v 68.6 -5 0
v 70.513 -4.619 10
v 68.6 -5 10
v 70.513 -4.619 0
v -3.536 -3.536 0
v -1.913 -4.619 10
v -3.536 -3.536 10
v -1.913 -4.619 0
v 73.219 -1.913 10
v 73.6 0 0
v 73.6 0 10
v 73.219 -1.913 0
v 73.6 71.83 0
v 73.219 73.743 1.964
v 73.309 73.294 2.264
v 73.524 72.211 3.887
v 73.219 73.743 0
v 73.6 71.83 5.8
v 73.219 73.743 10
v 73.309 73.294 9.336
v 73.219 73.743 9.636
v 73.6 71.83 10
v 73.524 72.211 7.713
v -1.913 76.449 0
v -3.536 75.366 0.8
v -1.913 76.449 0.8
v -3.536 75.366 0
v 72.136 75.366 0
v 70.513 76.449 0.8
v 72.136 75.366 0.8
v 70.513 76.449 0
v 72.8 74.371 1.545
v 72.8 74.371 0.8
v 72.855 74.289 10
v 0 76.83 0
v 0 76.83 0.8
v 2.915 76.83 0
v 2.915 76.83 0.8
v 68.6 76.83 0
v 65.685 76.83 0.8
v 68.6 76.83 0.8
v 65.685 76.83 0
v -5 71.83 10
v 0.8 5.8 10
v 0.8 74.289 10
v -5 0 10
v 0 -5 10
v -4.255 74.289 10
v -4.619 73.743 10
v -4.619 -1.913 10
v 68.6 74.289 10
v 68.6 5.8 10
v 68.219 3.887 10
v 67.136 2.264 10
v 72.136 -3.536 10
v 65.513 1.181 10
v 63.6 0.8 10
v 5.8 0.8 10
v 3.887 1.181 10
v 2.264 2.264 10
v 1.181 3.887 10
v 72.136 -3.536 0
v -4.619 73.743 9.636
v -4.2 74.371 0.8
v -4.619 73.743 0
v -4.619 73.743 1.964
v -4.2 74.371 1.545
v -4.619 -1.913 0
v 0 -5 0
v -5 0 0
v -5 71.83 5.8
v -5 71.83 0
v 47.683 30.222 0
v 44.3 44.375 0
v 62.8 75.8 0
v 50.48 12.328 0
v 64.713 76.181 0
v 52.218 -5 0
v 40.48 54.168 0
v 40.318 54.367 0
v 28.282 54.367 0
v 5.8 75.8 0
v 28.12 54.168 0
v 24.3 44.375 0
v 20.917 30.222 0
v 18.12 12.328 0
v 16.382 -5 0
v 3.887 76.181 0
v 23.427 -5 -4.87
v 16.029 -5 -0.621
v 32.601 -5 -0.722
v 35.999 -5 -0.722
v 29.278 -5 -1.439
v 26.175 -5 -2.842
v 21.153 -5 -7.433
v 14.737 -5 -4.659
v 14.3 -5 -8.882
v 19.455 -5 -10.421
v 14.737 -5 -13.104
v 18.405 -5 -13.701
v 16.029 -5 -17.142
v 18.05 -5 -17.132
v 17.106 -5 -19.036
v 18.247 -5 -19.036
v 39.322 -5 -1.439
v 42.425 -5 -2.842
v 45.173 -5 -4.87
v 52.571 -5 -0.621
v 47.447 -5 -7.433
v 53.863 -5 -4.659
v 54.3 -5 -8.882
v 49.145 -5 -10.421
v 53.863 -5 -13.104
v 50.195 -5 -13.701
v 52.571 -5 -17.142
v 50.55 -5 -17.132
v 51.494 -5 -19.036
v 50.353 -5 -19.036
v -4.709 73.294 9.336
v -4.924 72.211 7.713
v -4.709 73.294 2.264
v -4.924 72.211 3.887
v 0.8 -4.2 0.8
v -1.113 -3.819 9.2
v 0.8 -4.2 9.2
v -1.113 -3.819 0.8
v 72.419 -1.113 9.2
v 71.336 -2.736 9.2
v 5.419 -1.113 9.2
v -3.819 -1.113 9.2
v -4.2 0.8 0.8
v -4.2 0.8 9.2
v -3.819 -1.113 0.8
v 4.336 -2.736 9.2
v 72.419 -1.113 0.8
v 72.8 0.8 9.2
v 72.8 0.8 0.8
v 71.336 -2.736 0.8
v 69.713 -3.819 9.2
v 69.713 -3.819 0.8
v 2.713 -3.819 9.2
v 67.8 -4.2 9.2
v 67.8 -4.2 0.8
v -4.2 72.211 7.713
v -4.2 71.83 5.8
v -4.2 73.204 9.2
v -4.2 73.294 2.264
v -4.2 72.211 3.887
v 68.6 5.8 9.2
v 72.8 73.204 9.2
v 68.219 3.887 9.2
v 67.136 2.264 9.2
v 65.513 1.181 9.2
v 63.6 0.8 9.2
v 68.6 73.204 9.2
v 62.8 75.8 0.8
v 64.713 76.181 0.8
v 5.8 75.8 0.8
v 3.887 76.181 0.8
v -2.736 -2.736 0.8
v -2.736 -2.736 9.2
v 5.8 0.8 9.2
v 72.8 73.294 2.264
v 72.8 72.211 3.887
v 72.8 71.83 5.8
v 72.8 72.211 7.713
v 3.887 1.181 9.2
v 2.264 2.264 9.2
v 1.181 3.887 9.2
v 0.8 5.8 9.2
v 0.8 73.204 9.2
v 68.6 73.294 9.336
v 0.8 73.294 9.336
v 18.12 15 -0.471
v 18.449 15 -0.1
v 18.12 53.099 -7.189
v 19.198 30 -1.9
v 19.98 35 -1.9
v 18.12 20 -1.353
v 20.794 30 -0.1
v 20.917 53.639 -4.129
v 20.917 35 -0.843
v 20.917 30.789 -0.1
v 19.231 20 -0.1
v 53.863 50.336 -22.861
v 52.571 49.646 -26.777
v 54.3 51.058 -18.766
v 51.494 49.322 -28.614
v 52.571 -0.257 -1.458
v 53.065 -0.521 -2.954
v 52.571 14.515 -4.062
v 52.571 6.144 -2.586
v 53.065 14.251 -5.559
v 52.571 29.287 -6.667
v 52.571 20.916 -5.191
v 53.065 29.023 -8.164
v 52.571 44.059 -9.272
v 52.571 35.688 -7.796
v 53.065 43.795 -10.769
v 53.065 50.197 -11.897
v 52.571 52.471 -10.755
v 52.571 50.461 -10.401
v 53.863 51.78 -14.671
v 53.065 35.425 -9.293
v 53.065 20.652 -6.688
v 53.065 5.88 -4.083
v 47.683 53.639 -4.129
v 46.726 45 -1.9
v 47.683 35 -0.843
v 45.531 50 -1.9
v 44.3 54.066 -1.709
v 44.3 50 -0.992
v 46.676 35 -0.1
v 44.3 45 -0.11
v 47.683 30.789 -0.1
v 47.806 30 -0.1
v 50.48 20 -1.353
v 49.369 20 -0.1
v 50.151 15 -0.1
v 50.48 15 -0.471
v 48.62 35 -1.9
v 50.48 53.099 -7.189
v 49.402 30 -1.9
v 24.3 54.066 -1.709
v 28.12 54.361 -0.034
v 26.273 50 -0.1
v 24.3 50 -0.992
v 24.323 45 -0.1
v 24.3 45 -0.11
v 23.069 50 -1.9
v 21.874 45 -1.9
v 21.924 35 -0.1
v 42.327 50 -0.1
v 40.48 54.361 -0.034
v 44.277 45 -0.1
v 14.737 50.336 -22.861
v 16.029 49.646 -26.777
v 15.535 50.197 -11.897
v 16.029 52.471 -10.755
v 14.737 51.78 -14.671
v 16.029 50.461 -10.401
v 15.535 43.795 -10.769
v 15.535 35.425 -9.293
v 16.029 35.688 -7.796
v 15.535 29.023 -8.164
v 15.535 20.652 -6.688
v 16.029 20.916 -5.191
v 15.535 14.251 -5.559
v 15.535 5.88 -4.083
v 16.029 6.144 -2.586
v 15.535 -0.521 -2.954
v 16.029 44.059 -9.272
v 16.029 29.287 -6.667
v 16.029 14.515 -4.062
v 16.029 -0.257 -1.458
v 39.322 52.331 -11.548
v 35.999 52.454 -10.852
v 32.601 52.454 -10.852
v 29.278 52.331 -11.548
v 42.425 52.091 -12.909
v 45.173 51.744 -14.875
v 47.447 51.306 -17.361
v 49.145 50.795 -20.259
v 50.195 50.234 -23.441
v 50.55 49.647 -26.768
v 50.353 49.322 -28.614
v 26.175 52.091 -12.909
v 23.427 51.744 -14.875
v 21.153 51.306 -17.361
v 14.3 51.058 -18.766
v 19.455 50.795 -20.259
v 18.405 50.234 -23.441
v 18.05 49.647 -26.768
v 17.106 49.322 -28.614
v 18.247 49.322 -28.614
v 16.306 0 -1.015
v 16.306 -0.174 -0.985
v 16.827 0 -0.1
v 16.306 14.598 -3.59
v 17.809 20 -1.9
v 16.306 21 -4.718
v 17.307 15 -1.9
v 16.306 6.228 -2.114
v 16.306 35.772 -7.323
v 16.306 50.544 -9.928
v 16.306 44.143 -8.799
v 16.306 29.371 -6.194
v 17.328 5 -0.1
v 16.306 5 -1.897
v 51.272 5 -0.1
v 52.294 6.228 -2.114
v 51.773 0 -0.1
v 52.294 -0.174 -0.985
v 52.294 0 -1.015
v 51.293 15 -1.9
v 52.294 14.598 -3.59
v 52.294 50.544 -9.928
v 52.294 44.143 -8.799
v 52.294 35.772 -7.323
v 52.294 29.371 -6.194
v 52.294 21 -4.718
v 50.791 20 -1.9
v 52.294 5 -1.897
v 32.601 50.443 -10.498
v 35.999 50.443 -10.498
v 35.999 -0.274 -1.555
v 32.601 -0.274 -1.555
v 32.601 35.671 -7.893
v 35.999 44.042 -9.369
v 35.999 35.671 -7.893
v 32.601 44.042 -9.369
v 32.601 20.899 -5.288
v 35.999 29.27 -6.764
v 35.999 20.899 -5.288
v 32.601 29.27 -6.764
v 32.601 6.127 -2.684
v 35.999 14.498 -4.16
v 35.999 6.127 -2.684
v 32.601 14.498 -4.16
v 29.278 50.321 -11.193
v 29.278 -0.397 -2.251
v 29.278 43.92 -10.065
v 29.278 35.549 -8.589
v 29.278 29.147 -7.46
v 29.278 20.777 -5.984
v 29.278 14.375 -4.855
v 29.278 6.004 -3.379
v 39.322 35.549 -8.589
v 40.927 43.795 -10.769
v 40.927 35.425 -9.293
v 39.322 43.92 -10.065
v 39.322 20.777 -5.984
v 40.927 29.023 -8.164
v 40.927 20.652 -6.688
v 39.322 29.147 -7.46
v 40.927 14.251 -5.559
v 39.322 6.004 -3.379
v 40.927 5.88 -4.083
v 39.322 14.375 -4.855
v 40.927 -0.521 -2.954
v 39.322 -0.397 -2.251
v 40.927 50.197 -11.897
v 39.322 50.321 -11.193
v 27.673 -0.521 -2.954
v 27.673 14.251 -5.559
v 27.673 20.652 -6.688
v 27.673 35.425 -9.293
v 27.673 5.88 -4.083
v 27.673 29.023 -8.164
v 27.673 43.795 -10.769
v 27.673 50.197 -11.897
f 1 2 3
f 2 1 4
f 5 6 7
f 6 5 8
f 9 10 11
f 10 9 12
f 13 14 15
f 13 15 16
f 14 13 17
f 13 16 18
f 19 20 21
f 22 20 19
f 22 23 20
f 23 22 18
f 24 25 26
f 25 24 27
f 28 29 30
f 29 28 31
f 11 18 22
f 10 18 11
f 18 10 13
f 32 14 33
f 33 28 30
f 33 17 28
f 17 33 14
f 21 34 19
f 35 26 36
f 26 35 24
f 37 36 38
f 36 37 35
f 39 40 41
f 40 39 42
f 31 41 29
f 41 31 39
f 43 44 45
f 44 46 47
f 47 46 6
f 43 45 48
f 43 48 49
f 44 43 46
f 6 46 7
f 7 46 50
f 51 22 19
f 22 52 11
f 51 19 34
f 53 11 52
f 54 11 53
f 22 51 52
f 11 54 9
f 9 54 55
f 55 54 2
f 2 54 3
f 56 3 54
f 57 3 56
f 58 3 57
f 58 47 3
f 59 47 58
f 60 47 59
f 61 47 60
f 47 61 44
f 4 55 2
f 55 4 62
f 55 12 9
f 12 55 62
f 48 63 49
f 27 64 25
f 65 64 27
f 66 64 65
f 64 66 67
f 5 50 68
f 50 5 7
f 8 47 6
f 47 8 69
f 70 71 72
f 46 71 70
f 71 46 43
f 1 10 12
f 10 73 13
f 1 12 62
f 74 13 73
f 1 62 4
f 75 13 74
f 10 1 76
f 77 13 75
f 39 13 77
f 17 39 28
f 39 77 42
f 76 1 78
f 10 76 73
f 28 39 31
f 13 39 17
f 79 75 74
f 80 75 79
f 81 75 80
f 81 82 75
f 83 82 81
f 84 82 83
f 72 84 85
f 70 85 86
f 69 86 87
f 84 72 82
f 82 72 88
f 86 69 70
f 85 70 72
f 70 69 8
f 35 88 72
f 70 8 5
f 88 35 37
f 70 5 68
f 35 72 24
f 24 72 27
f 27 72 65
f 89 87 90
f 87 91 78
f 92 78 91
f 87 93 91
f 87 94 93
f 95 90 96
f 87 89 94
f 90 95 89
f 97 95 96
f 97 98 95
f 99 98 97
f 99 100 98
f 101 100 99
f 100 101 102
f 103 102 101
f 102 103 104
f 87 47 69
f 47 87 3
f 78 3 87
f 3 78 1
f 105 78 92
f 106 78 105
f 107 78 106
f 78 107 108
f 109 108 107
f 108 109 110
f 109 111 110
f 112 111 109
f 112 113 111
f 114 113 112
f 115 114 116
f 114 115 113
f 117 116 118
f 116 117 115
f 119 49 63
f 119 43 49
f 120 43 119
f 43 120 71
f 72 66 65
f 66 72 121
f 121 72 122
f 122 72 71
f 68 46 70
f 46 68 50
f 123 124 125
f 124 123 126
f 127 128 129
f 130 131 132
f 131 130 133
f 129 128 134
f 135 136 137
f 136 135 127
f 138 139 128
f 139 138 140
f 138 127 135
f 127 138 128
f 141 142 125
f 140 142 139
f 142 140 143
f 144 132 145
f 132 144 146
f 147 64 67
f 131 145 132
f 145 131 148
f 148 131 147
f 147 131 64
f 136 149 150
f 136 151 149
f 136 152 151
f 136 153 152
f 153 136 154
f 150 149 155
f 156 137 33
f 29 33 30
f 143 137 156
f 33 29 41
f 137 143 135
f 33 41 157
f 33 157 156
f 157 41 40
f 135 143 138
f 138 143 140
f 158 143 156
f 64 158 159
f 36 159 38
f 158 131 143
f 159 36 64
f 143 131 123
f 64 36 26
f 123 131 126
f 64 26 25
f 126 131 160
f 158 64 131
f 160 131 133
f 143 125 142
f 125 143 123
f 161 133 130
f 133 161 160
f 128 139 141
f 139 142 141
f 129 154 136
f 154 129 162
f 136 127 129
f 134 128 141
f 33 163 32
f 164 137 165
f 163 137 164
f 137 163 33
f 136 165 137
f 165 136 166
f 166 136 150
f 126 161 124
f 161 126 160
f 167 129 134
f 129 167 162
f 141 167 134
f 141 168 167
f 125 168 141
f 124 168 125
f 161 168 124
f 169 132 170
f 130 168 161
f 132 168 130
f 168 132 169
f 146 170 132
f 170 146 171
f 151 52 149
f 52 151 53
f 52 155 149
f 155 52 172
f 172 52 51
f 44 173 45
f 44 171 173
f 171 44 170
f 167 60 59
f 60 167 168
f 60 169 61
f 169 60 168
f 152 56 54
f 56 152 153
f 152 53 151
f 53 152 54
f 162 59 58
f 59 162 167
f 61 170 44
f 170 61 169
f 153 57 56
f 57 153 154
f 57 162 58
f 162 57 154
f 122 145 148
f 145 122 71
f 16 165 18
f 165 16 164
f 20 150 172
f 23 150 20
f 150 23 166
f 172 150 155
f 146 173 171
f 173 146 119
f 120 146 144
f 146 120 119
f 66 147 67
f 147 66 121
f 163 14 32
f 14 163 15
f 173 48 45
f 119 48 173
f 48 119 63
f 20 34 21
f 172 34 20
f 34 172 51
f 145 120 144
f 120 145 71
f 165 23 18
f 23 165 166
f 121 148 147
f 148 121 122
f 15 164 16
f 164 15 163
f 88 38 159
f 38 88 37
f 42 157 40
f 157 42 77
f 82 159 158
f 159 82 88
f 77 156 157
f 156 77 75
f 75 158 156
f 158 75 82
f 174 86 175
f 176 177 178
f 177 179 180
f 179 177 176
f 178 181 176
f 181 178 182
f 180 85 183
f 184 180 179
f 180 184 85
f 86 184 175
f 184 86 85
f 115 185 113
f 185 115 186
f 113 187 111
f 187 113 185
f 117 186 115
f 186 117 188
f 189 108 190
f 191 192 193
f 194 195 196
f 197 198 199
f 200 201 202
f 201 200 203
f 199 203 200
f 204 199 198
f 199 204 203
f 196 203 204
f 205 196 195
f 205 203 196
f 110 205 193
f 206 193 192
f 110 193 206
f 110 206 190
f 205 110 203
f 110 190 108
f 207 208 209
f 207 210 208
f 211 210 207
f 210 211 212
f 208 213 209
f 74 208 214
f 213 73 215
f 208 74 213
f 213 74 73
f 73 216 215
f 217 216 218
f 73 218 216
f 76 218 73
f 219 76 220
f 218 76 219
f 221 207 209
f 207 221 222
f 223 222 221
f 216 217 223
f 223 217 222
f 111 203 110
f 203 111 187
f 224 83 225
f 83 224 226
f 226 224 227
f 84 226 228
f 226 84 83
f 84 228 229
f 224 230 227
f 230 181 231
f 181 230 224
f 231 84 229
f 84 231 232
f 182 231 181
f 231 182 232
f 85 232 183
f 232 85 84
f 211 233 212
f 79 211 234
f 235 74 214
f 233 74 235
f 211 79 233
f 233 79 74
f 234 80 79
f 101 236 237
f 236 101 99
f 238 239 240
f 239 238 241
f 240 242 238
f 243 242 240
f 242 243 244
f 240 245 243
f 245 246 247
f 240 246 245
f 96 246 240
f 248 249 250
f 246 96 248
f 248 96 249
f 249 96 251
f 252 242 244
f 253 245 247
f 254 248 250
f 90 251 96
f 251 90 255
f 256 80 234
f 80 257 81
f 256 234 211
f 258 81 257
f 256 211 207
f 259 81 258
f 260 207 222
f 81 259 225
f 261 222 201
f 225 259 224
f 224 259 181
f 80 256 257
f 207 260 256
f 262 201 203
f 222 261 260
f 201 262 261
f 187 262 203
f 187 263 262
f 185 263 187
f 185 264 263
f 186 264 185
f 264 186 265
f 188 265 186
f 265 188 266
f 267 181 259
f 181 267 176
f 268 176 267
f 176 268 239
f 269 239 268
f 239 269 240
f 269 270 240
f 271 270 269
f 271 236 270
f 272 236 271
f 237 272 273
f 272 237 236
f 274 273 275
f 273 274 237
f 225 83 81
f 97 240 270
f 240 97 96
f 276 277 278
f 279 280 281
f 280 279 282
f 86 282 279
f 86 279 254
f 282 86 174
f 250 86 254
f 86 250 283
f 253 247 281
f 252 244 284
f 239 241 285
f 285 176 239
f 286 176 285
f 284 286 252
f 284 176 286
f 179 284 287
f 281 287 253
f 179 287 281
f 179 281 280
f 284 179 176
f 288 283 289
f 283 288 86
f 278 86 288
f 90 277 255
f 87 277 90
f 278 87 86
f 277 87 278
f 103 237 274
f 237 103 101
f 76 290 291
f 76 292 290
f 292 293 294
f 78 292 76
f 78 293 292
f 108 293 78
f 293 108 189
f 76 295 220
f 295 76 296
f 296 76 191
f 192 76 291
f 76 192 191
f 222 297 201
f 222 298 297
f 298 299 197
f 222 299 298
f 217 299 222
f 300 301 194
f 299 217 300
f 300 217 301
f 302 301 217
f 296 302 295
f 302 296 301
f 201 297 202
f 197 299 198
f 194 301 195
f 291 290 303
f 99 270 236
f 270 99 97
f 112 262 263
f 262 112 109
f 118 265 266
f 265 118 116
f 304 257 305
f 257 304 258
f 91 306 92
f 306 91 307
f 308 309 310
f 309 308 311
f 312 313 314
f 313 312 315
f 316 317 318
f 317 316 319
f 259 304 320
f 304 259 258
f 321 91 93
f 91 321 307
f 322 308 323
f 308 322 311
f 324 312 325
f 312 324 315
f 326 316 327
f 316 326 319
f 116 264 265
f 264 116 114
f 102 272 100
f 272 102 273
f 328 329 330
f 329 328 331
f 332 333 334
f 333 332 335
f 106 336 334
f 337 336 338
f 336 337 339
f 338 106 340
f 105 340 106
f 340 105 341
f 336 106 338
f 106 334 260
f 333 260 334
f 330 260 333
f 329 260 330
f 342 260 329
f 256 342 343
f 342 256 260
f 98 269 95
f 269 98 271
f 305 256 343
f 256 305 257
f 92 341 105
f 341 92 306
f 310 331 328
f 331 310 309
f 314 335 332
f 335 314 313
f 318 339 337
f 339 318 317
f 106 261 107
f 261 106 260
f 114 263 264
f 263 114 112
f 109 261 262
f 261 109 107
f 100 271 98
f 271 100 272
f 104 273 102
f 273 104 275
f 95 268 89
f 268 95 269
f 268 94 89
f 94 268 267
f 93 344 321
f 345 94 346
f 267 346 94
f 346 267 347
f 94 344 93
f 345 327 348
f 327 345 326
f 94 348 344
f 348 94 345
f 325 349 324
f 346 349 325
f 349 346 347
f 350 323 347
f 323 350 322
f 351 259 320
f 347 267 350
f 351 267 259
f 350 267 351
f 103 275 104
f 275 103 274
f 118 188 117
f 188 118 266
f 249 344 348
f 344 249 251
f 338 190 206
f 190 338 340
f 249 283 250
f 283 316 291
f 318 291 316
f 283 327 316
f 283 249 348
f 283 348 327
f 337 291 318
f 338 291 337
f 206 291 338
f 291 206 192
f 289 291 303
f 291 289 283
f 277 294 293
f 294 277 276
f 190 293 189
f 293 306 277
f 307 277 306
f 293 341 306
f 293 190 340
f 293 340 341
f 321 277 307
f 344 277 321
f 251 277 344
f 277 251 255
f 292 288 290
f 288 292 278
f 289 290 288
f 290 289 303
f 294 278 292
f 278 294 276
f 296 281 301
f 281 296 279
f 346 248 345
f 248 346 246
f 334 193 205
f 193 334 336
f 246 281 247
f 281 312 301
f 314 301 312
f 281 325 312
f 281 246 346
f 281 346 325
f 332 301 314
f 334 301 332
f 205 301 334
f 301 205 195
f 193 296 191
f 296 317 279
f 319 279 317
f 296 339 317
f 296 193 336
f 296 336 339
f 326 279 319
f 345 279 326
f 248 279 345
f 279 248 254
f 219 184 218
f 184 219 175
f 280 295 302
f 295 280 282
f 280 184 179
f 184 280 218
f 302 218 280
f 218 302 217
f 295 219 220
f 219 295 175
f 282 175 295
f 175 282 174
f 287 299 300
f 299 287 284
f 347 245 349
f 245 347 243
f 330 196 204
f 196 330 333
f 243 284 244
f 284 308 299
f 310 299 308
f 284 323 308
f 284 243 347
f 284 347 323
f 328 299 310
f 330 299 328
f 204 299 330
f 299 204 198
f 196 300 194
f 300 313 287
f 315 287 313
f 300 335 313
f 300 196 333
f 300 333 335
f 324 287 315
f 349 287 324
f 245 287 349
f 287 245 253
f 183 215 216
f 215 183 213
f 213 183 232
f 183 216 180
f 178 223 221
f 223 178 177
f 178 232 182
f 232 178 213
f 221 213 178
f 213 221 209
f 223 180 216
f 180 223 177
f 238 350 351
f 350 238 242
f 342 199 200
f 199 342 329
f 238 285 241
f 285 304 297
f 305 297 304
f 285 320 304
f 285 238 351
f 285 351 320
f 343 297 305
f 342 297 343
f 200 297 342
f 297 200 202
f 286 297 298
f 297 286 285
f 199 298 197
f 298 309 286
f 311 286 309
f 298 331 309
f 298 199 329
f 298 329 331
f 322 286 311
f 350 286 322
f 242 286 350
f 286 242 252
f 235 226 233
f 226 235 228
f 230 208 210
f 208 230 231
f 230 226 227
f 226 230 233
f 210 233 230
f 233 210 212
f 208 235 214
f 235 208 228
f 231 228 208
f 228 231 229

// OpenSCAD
/* $fn = 100; */
inner_width = 77;
inner_height = 139;
rad = 5;
thickness = 0.8;
depth = 10;
width = inner_width + (thickness * 2) - (2 * rad);
height = inner_height + (thickness * 2) - (2 * rad);
buttons_hole = 42;
buttons_hole_w = 6;
rant = 5;
over = 70;
buttons_h = 74;


mount_angle = 10;
inner_mount = 16.25;
outer_mount = 20;
mount_length = 62;

module baseblock(w=55, h=96, r=5, t=9) {
  hull() {
    cylinder(t, r=r);
    translate([w, 0, 0]) {
      translate([0, h, 0]) cylinder(t, r=r);
      cylinder(t, r=r);
      cylinder(t, r=r);
    }
    translate([0, h, 0]) cylinder(t, r=r);
  }
}



module phonecase_short() {
  short_height = height * 0.55;
  rrant = rant * 2;
  hrant = rant;
  difference() {
    baseblock(w=width, h=short_height, t=depth);
    /* hull() { */
      translate([thickness, thickness, thickness])
        baseblock(w=width - (thickness * 2), h=short_height * 2, t=depth - (thickness * 2));
      translate([thickness + rant, thickness + rant, thickness])
        baseblock(w=width - (thickness + rrant), h=short_height - (thickness * 2), t=depth);
    /* } */
    translate([width * 1.5, short_height+rad, rad+thickness])
      rotate(-90, [0, 1, 0])
        cylinder(width * 2, r=rad);
    translate([thickness + hrant, thickness + rrant + over, -thickness])
        baseblock(w=width - ((thickness + hrant) * 2), h=short_height - (thickness * 2), t=depth);
  }
}

module phonecase() {
  rrant = rant * 2;
  hrant = rant;
  difference() {
    baseblock(w=width, h=height, t=depth);
    hull() {
      translate([thickness, thickness, thickness])
        baseblock(w=width - (thickness * 2), h=height - thickness, t=depth - (thickness * 2));
      translate([thickness + rrant, thickness + rrant, thickness])
        baseblock(w=width - ((thickness + rrant) * 2), h=height - (thickness * 2), t=depth);
    }
    translate([thickness + hrant, thickness + rrant + over, -thickness])
        baseblock(w=width - ((thickness + hrant) * 2), h=height - (thickness * 2), t=depth);
    translate([width + rad - (thickness * 1.5), buttons_h, (depth - buttons_hole_w) / 2])
      cube([thickness*2, buttons_hole, buttons_hole_w]);
  }
}

module bikemount() {
    rotate(-90 - mount_angle, [1, 0, 0])
      intersection() {
        translate([-outer_mount, -outer_mount - (outer_mount / 2), -thickness / 2])
          cube([outer_mount * 2, outer_mount * 2, mount_length + thickness]);

        difference() {
          cylinder(mount_length, r=outer_mount);
          translate([0, inner_mount / 2, -thickness])
            cylinder(mount_length + (thickness * 2), r=inner_mount);
        }
      }
}

module mount_holes() {
  space = 15;
  for (shift = [0 : space : mount_length - (space + thickness)]) {
    rotate(-mount_angle, [1, 0, 0])
      translate([0,shift,-3])
        cube([width,6.5,2]); // 6mm stepper belt (for the grip)
    translate([0,shift,-1.9])
      cube([width,5,1.8]); // zip tie
  }
}

difference() {
  union() {
    /* phonecase(); */
    phonecase_short();
    translate([0, -2*rad, 0])
      intersection() {
        translate([width / 2, 0, -8])
          bikemount();
        translate([0, rad, - 2 * outer_mount])
            cube([width, mount_length, outer_mount * 2]);
      }
  }
  mount_holes();
}
